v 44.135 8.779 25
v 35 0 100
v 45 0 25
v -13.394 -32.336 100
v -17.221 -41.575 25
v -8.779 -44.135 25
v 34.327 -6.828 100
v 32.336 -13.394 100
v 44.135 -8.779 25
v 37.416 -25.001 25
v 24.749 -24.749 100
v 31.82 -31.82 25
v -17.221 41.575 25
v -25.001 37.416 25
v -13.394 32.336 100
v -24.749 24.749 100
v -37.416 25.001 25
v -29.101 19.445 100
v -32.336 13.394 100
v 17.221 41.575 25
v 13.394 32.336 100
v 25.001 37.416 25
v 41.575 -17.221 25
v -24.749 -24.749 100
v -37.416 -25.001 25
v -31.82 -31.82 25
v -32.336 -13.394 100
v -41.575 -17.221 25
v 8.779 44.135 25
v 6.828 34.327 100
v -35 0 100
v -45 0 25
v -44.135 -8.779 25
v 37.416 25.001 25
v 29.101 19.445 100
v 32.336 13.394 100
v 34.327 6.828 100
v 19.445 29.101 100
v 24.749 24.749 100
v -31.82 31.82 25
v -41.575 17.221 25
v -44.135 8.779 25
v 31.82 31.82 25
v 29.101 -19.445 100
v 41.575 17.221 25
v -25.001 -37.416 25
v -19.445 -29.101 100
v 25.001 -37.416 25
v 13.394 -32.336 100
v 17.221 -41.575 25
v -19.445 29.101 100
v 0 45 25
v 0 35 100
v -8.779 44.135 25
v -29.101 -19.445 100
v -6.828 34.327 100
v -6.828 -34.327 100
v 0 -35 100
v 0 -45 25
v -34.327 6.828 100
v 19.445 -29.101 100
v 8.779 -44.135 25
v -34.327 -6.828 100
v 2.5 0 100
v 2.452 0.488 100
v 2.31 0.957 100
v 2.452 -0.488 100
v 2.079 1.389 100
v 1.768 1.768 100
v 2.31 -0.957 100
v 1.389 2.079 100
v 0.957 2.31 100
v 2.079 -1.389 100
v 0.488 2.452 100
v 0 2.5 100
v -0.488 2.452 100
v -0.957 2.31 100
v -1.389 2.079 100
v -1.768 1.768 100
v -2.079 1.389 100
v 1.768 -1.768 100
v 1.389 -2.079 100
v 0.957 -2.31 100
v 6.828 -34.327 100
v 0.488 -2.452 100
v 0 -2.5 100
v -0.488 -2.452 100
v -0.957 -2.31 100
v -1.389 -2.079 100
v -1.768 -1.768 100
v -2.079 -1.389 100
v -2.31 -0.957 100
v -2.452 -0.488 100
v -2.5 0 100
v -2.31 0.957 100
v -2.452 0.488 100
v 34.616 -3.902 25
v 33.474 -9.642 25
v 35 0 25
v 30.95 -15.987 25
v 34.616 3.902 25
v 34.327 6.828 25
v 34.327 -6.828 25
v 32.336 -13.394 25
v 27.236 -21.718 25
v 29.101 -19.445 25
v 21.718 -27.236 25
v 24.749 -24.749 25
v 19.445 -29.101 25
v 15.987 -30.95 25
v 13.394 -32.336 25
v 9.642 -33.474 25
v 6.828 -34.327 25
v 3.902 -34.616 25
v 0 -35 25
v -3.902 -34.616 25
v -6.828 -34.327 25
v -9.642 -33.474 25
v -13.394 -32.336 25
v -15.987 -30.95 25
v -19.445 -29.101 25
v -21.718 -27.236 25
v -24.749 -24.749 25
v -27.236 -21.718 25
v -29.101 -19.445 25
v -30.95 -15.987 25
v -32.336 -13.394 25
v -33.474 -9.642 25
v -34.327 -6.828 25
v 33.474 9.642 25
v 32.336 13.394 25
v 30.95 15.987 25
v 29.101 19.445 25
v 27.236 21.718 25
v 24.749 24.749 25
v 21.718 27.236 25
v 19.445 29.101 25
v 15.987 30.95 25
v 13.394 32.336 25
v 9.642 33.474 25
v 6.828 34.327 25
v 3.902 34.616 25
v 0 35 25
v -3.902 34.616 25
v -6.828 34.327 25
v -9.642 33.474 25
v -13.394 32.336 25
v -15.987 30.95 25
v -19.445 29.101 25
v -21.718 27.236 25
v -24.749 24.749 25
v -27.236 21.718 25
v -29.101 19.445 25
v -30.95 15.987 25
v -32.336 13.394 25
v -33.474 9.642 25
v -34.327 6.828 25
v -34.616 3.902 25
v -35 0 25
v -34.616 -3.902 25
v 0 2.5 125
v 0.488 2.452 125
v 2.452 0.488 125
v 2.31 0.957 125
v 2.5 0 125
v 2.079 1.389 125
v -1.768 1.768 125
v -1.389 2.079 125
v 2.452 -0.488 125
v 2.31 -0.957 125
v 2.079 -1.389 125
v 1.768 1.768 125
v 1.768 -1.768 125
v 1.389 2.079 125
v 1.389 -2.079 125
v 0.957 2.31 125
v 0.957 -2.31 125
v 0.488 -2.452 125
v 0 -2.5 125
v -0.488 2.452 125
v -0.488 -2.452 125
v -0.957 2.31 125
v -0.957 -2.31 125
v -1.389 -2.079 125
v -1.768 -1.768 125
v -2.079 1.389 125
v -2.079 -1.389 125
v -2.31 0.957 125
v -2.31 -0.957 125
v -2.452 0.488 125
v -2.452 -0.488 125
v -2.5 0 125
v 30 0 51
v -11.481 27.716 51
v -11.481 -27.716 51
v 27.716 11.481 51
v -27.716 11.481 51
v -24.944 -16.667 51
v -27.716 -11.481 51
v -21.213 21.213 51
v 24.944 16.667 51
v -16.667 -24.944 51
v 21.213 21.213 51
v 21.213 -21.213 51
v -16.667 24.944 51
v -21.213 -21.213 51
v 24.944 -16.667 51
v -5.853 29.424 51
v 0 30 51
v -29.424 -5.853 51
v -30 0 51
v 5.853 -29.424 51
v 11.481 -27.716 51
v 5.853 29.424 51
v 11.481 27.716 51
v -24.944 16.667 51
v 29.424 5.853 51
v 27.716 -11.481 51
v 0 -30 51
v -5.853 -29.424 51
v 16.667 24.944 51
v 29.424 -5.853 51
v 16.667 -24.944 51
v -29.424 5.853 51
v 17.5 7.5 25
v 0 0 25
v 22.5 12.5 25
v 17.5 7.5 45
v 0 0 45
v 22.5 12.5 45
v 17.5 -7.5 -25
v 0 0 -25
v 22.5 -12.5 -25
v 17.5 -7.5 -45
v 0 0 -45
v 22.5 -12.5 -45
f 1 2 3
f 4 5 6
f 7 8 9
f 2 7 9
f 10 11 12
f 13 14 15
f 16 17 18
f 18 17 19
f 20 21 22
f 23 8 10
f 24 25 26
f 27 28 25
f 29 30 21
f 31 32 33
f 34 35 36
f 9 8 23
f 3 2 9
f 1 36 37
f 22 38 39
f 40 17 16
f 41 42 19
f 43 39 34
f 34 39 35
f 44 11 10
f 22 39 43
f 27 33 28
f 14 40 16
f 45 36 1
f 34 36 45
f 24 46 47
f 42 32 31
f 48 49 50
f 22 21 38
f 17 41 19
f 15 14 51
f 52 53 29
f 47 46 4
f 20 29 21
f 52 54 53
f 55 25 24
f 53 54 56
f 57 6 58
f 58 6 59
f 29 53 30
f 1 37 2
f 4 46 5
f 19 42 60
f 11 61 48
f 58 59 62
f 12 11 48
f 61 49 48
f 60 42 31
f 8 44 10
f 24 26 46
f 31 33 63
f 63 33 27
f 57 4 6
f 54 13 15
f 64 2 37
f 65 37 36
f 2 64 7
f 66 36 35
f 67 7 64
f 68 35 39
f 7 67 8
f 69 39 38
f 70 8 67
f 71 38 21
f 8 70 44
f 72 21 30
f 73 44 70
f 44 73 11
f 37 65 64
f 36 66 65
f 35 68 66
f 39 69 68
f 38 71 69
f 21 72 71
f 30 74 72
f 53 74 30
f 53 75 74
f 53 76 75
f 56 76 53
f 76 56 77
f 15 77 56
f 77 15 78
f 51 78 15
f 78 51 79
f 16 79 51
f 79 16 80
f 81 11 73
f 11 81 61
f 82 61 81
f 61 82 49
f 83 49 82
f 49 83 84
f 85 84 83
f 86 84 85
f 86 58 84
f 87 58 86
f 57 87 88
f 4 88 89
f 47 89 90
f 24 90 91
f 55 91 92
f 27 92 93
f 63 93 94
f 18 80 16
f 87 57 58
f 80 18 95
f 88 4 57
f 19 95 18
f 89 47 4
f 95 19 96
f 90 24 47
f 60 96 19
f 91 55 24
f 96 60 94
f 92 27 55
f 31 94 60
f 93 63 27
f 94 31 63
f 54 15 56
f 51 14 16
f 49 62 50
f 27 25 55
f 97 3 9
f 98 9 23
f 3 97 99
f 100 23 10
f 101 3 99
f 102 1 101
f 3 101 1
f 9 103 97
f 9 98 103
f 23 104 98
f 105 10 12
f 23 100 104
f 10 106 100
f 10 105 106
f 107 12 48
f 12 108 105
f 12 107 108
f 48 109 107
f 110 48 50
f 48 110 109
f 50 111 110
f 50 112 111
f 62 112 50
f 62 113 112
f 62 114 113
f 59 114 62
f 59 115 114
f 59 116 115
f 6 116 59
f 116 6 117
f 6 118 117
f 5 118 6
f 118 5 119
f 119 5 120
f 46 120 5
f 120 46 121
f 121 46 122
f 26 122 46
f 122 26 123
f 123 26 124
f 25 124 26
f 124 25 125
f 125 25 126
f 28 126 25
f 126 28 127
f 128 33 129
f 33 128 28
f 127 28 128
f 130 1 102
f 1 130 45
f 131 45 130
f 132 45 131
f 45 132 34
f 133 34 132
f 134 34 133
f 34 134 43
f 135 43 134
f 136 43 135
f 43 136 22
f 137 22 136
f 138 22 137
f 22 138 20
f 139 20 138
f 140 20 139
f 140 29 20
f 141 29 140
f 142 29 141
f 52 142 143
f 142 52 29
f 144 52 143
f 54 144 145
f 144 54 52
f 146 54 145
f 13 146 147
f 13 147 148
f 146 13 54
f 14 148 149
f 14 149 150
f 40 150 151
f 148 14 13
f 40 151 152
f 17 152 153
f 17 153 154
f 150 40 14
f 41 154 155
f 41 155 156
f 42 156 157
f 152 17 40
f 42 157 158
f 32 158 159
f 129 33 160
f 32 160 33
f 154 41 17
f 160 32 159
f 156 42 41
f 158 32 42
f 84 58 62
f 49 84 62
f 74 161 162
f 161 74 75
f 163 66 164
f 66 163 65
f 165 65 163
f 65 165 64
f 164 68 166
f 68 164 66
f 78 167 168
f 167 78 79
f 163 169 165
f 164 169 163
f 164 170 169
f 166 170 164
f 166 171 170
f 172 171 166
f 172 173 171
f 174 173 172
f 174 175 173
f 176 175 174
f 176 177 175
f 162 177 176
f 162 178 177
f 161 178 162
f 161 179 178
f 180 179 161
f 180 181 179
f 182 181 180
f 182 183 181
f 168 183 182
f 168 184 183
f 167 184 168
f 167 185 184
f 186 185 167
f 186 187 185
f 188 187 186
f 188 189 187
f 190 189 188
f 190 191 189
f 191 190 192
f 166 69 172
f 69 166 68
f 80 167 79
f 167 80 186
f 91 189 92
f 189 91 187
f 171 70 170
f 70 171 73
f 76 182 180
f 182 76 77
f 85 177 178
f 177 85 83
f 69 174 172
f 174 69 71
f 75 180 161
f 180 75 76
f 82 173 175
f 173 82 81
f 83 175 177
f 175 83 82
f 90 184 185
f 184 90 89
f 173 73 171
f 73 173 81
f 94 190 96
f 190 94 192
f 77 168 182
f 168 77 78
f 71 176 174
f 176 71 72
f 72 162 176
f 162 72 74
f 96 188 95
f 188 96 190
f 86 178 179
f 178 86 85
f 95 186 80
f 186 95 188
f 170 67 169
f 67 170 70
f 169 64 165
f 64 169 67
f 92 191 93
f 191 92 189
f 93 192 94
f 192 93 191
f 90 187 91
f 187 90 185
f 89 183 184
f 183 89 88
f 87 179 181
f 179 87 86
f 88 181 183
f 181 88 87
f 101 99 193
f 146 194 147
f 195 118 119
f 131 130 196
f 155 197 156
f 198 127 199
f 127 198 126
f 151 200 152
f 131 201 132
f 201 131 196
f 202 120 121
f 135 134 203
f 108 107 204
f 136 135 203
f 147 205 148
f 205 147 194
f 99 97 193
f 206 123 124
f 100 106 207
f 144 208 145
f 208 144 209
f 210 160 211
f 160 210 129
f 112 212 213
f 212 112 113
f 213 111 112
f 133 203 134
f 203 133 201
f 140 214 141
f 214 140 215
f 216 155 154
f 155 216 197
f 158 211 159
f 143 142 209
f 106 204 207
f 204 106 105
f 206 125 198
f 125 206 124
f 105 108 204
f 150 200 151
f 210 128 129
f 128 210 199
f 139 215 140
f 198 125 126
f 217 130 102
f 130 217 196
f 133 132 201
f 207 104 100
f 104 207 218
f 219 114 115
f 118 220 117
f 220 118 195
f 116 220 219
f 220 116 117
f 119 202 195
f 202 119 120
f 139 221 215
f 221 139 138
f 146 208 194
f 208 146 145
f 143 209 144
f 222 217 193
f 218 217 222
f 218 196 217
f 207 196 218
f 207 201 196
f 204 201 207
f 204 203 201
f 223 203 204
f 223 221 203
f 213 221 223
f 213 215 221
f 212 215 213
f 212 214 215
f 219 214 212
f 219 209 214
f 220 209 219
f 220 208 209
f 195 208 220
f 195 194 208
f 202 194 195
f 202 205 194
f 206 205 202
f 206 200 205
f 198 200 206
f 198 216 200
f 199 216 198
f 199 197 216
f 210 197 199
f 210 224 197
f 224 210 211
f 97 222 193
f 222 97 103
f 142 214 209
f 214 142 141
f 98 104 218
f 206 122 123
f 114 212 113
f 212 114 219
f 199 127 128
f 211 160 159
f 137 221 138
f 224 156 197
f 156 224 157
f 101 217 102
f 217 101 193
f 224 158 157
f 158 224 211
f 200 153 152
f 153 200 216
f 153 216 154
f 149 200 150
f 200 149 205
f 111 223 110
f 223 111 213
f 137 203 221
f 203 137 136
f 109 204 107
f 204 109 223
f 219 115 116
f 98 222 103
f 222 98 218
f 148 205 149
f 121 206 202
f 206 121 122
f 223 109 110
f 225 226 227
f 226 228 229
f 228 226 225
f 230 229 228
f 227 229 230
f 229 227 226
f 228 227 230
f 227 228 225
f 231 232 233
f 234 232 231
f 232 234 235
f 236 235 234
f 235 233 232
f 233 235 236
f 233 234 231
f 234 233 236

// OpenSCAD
// Generated by CadMonkey
// Prompt: hey cadmonkey, create me a pyramid
// Generated at: 2025-11-11 05:54:25

// Realistic Pyramid - Medium Complexity
// Dimensions in mm, printable without supports

$fn = 32;  // Smooth curves for printing

module pyramid(height=50) {
    // Main pyramid body with rounded edges
    difference() {
        union() {
            // Base pyramid shape (truncated cube)
            translate([0, 0, height/2])
                cylinder(h=height*1.5, r1=height*0.9, r2=height*0.7);
            
            // Top pyramid point (cylinder)
            translate([0, 0, height])
                cylinder(h=height*1.5, r=height*0.05);
        }
        
        // Hollow out the interior
        translate([0, 0, -1])
            cylinder(h=height+2, r1=height*0.8, r2=height*0.6);
            
        // Add base fillet for realism
        translate([0, 0, -2])
            sphere(r=height*0.03);
    }
    
    // Add decorative ridges along sides
    module side_ridge(side_angle) {
        rotate([side_angle, 0, 0]) 
            translate([0, 0, height/2 + 10])
                linear_extrude(height=20, center=true)
                    polygon(points=[[0,0], [height*0.35, height*0.15], [height*0.45, height*0.25]]);
    }
    
    side_ridge(0);
    side_ridge(180);
}

// Create the complete pyramid
pyramid();
